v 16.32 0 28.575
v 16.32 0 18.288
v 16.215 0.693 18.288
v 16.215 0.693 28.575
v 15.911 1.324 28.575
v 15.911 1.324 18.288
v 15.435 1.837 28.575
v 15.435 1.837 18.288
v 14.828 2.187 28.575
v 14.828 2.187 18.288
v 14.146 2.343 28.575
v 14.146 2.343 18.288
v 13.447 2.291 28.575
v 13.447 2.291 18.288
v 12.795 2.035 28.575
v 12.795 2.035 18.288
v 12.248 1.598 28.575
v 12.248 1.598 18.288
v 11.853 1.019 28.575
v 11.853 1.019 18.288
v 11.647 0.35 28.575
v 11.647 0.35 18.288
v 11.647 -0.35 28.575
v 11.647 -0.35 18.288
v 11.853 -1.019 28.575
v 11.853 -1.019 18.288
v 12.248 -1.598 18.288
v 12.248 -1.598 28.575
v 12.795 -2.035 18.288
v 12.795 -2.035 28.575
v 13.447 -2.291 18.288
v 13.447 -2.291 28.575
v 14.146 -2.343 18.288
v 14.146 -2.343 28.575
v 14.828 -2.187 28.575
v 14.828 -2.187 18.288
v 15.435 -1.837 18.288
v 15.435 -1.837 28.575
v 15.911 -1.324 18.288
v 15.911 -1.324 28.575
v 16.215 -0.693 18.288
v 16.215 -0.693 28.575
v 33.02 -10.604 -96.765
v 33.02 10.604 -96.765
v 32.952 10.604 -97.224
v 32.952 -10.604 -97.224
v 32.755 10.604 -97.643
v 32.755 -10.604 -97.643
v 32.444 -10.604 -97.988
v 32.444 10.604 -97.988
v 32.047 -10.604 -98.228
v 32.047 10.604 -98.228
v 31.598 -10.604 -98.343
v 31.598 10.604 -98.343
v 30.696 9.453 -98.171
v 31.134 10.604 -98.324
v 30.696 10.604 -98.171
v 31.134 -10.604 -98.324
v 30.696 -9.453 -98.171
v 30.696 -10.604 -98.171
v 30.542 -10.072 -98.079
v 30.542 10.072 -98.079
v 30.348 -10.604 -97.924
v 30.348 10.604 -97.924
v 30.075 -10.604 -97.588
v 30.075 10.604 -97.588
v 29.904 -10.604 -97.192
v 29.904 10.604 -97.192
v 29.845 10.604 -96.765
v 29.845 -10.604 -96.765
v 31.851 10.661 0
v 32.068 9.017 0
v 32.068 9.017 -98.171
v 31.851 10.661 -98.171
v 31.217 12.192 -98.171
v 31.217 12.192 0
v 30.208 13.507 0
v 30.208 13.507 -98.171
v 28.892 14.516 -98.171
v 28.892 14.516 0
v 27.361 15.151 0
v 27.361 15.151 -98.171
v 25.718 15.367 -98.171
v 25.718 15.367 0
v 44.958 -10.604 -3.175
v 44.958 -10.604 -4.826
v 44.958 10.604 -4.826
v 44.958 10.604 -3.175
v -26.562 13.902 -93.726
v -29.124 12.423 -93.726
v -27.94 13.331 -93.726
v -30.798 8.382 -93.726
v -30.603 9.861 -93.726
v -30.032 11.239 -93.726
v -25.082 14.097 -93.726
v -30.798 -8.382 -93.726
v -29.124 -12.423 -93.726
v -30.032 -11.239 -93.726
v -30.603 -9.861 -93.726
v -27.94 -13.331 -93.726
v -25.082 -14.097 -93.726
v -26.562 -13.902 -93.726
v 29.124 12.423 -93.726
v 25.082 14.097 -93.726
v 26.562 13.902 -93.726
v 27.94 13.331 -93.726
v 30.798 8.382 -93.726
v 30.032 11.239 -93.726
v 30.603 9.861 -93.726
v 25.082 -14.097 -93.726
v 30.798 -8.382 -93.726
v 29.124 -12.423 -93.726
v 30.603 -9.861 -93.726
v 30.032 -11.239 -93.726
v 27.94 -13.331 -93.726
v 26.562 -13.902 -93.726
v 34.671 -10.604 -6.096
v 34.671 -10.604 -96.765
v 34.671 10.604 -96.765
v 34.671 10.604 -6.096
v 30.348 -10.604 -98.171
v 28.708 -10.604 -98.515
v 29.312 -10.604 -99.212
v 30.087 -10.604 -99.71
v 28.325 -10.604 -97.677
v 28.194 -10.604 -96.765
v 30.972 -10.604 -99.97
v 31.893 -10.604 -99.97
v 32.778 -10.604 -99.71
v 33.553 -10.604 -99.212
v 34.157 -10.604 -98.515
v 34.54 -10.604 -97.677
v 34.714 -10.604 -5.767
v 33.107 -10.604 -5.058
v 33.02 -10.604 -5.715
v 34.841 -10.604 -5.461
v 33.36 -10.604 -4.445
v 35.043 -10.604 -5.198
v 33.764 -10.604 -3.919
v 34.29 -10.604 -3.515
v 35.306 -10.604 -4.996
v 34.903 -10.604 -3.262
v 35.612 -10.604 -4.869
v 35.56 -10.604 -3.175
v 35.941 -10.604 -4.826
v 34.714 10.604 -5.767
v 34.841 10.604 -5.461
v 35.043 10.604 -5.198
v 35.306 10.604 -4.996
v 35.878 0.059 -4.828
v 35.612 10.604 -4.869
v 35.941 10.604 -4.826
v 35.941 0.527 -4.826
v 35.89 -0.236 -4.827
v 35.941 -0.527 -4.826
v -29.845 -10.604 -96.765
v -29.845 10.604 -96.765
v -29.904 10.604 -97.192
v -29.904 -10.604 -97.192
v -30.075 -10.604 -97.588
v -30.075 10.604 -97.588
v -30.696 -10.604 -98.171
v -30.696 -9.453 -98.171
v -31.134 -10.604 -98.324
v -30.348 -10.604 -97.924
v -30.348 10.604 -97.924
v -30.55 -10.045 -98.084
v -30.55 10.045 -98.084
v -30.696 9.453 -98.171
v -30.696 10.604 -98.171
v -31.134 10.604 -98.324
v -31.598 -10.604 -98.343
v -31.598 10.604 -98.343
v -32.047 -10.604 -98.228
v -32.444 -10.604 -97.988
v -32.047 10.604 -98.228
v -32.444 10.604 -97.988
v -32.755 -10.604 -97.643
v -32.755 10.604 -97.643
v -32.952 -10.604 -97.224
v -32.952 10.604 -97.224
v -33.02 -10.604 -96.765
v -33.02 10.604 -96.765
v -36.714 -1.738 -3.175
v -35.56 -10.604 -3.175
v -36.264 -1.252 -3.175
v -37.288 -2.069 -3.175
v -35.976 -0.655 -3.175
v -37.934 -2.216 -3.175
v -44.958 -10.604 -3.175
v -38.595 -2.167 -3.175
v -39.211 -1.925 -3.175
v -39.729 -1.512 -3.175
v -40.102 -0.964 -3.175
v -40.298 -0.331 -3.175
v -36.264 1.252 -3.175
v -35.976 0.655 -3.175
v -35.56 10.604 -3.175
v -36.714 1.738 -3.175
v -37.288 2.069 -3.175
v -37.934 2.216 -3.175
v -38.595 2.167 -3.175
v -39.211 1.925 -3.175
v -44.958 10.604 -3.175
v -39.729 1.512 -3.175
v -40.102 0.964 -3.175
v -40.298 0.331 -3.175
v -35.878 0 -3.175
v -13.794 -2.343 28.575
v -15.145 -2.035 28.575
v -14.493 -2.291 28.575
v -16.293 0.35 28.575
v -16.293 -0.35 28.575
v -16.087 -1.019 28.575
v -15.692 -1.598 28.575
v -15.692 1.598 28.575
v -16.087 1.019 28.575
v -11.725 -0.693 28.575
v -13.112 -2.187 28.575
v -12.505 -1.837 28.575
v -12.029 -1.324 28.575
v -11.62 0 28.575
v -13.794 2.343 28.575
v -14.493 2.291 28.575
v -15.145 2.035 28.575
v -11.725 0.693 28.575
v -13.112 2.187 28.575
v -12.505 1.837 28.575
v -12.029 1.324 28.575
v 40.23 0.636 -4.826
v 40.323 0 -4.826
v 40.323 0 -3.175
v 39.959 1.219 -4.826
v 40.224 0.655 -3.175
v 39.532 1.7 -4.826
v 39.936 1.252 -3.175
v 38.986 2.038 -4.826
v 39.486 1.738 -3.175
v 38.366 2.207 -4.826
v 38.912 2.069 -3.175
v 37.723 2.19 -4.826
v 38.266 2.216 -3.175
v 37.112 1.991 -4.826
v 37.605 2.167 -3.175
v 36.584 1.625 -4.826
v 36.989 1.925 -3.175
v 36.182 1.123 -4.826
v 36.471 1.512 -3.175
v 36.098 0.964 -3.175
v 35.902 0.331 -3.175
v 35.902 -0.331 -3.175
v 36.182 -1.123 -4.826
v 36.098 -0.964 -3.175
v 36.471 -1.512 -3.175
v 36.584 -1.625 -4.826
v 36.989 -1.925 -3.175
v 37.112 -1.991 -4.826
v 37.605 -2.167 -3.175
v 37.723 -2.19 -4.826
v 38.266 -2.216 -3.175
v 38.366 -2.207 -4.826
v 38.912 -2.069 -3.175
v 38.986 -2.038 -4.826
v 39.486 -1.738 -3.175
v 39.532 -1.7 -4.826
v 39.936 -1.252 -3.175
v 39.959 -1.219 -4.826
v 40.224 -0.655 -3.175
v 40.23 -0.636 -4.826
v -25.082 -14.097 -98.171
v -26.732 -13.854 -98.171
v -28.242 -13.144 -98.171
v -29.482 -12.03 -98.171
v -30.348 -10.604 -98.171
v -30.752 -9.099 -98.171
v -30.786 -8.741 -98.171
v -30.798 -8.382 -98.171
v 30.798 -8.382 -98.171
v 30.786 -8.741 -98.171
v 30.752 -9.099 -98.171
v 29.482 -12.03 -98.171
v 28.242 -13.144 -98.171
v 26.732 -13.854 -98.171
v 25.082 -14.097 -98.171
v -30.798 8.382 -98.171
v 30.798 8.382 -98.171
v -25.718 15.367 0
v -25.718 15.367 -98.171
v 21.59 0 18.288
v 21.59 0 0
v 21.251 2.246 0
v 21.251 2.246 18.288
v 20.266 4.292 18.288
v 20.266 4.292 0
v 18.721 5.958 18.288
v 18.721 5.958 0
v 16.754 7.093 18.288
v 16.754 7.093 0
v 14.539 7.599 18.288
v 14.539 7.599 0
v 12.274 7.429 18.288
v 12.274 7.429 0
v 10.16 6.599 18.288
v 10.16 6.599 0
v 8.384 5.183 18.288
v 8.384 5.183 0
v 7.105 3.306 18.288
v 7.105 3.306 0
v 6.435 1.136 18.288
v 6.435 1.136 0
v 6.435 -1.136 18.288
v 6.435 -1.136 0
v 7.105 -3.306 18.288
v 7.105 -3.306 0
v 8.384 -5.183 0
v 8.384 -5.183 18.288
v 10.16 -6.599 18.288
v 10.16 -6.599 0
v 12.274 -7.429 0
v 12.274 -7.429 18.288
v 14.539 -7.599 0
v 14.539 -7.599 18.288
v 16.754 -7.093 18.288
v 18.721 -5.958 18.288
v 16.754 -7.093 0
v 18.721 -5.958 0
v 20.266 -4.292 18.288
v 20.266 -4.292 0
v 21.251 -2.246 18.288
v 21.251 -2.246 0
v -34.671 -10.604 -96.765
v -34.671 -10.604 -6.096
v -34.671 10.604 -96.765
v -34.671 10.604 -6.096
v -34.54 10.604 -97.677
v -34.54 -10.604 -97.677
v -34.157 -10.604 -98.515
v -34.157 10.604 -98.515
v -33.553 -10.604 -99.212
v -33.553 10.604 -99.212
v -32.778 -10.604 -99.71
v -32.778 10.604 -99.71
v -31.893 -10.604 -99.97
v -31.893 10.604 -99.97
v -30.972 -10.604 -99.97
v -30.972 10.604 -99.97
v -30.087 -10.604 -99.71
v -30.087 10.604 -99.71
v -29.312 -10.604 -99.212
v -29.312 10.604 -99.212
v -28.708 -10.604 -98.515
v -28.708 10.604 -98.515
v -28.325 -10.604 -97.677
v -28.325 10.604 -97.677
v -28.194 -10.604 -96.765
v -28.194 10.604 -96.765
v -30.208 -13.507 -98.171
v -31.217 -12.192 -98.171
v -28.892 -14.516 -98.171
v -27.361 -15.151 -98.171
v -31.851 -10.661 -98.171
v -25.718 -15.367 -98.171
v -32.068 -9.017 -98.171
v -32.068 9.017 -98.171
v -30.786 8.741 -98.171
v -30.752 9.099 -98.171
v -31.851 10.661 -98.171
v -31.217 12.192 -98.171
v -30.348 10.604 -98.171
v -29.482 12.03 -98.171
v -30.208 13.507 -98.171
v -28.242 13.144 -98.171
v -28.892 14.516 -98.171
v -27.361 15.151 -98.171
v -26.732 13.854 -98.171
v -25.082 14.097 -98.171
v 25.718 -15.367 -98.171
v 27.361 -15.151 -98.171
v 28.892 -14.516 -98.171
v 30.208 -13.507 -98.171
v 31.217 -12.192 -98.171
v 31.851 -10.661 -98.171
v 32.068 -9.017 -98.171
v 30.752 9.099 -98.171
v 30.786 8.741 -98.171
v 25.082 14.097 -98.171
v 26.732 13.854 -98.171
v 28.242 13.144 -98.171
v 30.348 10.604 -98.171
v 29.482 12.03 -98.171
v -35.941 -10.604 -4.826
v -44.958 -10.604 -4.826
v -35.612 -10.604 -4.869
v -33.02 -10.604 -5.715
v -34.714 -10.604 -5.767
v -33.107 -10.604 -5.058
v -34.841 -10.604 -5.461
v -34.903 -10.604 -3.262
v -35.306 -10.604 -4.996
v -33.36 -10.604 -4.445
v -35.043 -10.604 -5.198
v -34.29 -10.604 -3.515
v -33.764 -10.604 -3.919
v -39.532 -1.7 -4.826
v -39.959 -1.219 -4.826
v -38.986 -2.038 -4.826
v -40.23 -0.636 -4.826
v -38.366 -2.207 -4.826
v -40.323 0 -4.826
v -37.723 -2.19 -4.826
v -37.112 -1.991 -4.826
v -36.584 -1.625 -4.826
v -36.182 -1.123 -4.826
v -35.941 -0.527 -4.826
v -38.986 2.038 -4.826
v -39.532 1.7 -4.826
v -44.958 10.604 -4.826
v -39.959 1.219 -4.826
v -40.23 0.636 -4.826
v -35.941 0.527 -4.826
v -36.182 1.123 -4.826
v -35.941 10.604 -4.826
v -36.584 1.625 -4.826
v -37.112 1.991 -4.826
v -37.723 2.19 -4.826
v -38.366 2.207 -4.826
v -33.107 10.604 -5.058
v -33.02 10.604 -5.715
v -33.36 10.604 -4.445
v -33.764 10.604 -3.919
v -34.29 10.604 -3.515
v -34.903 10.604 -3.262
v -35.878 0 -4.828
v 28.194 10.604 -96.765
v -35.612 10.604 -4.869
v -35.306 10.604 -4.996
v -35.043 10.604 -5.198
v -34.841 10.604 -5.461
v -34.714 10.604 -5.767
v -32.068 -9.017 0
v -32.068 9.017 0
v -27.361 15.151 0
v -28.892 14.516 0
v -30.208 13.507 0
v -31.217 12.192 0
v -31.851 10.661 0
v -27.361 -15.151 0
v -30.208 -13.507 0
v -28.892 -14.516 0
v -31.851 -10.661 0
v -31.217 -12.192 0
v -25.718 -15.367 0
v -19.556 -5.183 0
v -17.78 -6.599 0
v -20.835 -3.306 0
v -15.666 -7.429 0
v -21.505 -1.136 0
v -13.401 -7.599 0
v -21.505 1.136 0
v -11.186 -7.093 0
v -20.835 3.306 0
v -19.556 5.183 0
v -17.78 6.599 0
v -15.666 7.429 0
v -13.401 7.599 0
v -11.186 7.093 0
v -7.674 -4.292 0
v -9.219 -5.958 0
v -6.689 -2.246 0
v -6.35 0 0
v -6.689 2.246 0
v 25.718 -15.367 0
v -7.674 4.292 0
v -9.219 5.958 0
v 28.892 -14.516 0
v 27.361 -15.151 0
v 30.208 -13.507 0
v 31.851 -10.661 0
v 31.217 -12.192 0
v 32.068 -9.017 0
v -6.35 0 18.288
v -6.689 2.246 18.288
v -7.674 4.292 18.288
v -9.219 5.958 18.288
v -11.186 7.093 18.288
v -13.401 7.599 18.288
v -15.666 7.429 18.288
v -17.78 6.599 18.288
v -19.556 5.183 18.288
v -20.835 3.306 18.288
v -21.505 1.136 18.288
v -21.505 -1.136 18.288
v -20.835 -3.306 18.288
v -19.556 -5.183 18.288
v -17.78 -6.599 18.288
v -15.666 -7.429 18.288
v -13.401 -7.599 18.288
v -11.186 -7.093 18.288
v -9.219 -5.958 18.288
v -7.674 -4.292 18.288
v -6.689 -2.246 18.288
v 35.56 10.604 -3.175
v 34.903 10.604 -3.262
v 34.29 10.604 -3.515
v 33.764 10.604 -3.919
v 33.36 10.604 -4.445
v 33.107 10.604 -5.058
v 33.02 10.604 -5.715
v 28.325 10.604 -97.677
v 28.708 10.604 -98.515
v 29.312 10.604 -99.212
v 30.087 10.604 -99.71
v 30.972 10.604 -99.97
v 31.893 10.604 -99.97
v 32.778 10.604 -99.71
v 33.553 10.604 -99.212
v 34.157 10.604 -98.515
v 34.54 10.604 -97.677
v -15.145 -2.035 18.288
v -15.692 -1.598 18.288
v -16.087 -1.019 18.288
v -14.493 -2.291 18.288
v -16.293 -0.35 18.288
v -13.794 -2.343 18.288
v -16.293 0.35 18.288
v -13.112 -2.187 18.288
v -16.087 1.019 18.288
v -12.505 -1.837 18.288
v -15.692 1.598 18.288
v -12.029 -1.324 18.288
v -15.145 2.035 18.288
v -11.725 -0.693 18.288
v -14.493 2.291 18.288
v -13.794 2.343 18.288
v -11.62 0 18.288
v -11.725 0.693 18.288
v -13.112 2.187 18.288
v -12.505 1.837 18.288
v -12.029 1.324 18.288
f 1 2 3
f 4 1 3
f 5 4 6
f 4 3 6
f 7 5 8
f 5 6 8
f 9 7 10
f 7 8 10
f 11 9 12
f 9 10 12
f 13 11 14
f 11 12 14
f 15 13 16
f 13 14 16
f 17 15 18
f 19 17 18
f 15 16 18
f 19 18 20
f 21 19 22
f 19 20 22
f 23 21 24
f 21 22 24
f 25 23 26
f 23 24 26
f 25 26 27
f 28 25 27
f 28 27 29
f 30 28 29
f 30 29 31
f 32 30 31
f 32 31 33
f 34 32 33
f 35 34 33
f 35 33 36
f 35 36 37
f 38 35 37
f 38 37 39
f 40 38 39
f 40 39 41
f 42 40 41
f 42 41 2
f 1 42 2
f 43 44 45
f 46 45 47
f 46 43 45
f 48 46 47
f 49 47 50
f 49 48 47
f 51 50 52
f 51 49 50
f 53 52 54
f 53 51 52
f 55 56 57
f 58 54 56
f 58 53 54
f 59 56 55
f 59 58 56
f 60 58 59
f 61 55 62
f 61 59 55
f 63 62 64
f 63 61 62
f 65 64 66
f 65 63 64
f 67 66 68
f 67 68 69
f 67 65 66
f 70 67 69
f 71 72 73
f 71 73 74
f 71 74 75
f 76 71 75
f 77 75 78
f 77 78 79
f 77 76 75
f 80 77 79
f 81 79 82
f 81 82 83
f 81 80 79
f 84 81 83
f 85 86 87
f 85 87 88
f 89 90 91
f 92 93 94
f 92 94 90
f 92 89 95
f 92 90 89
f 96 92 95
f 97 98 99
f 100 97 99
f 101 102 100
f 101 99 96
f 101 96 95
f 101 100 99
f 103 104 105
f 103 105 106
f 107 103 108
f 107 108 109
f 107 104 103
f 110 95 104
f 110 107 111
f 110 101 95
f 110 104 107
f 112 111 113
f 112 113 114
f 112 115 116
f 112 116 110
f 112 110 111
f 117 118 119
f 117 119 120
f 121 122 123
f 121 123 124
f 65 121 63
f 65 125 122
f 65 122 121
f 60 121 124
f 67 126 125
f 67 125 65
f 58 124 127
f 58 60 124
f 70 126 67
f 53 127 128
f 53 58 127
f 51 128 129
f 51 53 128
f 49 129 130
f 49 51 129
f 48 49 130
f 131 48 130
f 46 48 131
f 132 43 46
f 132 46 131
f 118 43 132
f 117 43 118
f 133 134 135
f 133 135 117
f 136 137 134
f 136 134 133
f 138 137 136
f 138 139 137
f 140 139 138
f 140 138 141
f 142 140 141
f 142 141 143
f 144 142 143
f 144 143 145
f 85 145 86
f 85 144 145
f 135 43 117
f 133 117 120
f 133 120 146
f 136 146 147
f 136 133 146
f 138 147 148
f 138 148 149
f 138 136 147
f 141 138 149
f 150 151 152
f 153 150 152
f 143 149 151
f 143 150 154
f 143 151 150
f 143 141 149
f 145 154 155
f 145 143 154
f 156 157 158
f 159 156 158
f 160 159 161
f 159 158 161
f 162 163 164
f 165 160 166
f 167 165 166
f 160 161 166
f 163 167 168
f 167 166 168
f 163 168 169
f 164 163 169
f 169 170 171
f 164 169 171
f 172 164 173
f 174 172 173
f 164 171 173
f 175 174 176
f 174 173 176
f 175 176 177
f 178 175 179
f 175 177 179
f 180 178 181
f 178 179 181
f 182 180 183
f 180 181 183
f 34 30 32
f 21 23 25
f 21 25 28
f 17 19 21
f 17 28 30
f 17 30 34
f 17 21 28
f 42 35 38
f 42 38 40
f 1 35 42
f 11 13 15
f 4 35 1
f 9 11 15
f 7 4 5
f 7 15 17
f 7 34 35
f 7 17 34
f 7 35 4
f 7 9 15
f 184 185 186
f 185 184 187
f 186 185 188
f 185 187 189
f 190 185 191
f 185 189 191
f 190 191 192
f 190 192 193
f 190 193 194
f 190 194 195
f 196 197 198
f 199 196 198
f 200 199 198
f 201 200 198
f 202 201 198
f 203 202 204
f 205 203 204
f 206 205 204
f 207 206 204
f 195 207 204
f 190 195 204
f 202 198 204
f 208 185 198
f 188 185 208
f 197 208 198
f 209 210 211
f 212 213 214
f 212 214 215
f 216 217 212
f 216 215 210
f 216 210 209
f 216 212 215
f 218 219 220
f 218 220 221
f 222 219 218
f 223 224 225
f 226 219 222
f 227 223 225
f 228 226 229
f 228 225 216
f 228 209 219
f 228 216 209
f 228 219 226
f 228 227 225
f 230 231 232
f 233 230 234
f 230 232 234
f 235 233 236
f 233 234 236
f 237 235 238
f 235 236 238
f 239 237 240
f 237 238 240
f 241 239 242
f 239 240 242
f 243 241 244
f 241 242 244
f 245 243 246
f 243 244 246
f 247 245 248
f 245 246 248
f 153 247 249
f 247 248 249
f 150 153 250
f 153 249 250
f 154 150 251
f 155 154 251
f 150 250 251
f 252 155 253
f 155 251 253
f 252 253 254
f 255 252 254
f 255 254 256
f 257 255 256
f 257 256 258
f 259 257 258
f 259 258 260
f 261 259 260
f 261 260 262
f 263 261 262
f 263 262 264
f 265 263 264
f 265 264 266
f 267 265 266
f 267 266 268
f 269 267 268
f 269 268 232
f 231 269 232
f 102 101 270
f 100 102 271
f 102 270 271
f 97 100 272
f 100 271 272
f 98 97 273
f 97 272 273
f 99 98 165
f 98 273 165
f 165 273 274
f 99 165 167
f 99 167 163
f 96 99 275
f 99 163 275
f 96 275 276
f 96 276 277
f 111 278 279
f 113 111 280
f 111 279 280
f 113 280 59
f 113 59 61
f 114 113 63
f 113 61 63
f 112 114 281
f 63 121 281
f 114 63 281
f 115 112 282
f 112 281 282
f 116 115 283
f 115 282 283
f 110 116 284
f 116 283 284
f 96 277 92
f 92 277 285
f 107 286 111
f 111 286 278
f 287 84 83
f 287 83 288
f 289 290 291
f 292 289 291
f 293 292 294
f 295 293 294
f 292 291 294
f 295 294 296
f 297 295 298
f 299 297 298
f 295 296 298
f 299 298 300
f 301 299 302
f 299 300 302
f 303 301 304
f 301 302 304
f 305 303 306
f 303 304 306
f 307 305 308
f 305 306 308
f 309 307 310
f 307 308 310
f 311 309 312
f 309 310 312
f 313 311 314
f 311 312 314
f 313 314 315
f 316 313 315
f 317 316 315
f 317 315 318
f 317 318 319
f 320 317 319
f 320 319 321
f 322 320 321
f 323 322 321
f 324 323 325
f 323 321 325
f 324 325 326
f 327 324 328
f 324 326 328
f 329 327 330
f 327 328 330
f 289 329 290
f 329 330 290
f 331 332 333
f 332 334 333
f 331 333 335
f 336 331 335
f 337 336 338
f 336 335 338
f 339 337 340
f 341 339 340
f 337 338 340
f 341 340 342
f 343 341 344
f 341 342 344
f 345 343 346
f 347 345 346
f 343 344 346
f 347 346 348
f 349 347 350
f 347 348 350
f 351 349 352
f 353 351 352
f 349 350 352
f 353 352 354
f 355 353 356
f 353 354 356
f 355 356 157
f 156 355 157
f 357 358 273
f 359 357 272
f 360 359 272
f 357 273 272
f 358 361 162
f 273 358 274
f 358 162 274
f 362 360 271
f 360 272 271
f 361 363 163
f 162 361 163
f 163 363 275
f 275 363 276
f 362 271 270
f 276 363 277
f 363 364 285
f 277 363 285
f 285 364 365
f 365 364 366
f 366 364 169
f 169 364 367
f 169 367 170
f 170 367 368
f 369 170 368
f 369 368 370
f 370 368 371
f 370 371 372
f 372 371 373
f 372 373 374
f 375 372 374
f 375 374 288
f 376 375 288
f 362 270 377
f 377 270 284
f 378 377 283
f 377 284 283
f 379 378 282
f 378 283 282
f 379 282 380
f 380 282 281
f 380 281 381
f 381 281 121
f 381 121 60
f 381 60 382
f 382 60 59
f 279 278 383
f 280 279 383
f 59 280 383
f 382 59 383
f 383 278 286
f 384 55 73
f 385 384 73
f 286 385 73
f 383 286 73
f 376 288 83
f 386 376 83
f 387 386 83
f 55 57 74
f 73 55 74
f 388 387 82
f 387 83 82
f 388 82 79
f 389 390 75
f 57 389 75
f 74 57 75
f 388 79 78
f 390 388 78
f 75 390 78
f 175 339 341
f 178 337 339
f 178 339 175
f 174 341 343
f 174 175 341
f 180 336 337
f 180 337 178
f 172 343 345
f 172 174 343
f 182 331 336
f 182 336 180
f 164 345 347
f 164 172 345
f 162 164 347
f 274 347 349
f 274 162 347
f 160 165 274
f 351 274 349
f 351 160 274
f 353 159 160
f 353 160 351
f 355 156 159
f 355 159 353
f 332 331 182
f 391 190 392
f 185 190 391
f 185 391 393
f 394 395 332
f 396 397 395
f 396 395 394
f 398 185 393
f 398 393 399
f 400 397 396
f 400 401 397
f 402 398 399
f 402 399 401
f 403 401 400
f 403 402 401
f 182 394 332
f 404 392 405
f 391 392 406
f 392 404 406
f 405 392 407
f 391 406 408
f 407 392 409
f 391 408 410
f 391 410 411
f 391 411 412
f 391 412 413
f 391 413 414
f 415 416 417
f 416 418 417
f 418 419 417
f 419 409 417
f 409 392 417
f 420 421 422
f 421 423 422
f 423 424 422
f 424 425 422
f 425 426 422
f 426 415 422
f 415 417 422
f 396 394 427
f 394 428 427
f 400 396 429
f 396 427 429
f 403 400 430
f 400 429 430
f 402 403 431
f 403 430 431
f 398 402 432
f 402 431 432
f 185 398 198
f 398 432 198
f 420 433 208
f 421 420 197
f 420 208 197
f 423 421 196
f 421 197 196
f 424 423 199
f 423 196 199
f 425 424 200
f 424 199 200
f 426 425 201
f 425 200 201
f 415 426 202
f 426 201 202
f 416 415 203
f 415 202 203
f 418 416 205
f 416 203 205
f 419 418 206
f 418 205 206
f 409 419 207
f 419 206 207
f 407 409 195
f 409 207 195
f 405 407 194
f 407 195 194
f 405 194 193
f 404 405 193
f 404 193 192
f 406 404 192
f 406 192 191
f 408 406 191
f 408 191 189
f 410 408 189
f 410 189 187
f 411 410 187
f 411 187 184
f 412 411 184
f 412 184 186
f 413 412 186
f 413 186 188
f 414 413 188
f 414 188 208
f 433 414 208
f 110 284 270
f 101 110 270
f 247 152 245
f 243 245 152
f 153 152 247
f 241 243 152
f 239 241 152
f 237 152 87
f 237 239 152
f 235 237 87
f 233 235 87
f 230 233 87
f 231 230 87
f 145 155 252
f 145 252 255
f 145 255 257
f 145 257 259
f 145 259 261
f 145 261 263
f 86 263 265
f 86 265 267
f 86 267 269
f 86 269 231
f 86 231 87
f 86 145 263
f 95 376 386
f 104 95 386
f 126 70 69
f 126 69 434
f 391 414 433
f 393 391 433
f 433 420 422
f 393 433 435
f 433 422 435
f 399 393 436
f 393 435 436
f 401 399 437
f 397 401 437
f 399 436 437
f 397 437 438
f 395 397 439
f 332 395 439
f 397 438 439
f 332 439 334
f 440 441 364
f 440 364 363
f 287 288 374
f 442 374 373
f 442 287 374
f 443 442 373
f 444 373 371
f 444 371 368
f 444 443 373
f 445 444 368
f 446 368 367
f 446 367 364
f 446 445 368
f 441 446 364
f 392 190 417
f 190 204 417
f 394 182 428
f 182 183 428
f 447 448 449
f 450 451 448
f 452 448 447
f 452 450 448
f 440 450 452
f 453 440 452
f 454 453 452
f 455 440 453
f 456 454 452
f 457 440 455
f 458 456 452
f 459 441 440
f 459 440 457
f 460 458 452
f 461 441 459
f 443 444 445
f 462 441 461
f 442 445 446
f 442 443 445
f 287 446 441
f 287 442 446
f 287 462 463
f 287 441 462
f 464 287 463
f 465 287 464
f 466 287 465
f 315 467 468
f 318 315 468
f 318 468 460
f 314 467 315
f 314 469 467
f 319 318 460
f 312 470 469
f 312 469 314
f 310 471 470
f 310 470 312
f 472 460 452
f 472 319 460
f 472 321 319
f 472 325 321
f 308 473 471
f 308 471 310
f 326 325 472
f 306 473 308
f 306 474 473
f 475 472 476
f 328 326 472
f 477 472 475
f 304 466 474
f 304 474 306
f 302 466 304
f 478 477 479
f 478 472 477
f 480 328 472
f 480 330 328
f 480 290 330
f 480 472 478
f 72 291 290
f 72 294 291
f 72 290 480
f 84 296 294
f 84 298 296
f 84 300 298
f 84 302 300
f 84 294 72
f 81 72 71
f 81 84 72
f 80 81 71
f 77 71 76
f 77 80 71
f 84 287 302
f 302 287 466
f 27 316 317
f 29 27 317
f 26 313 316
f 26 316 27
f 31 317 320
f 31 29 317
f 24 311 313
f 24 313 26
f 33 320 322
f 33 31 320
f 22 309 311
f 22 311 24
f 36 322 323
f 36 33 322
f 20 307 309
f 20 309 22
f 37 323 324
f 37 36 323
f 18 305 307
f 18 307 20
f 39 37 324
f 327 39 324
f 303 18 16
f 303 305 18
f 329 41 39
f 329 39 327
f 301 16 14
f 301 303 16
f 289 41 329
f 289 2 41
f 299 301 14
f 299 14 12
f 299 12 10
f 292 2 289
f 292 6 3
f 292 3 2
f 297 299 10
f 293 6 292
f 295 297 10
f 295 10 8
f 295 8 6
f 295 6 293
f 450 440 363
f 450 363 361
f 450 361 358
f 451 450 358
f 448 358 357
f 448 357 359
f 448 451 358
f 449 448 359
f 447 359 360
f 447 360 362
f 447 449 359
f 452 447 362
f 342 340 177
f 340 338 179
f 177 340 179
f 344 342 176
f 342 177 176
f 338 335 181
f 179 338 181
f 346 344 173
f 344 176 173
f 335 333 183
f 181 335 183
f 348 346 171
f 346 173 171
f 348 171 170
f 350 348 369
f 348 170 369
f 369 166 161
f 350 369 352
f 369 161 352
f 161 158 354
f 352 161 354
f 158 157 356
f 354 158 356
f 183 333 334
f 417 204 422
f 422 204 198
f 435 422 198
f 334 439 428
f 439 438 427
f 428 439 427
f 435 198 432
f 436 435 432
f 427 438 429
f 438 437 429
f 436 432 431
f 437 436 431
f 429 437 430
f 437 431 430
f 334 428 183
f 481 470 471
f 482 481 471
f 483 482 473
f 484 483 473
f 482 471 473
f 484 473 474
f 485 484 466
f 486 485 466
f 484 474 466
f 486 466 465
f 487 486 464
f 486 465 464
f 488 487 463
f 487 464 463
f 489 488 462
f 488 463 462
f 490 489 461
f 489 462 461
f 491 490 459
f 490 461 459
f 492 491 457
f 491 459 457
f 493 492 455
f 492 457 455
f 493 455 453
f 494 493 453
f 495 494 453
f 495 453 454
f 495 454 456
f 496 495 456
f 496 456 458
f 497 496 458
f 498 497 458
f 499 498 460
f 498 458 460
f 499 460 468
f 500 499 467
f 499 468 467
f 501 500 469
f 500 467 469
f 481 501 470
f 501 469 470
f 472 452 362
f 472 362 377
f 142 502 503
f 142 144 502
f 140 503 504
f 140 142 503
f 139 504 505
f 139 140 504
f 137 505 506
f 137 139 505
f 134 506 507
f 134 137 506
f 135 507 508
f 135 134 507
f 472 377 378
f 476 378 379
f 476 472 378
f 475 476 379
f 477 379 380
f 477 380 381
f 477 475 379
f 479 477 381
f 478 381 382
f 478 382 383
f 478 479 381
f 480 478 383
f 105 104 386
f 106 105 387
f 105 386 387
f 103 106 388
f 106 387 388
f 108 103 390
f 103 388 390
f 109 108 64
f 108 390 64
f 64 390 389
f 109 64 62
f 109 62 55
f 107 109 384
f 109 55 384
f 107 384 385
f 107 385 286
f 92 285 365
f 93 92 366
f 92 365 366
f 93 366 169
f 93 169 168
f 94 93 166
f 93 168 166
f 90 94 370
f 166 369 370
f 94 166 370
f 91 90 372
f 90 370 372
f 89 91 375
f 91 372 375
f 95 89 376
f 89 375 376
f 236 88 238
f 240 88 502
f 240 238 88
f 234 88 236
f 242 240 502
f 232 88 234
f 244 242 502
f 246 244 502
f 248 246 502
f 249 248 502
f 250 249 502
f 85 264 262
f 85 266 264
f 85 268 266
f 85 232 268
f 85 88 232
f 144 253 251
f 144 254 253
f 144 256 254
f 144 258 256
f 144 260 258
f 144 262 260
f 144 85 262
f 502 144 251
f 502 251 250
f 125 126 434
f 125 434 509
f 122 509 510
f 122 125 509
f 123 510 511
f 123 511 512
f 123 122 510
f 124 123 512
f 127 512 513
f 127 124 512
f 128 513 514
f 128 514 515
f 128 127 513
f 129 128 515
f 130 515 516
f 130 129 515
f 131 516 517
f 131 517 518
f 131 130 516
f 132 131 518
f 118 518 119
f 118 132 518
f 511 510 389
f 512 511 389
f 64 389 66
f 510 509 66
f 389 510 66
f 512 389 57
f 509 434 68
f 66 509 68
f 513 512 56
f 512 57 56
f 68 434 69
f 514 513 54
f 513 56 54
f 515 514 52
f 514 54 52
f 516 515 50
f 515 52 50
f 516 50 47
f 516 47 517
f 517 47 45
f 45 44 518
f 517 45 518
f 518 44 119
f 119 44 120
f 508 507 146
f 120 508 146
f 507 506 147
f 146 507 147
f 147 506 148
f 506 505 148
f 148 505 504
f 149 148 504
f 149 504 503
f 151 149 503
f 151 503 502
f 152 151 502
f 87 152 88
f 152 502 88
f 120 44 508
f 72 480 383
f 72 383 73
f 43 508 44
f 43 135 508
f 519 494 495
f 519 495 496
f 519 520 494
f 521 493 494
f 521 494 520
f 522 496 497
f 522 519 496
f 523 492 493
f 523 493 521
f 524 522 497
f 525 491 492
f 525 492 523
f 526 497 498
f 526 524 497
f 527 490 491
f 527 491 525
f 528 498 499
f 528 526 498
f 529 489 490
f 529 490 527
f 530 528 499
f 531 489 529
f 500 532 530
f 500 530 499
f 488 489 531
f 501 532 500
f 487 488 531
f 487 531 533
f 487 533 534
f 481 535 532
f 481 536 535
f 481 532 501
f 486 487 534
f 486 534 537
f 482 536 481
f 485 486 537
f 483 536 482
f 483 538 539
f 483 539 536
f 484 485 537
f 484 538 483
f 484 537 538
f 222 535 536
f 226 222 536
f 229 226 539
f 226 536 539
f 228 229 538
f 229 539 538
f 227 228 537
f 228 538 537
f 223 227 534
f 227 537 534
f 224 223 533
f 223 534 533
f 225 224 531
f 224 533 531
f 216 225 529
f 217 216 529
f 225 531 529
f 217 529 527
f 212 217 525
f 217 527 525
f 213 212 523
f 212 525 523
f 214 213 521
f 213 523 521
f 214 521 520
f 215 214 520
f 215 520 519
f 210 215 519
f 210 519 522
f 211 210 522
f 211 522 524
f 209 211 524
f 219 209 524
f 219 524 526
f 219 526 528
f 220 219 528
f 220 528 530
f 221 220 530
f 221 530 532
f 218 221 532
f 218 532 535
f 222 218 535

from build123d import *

# Parameters (mm, degrees)
F0_R     = 7.62
F0_R_2   = 2.3495
F1_DEPTH = 98.171
F2_DEPTH = 18.288
F3_DEPTH = 28.575
F5_DEPTH = 4.445
F7_DEPTH = 10.6045
F8_R     = 2.2225
F9_DEPTH = 2.54


with BuildPart() as f1:
    # F0 (on Top) → F1 (new body)
    with BuildSketch(Plane.XY):
        with BuildLine():
            ThreePointArc((32.0675, 9.017), (30.207628, 13.507128), (25.7175, 15.367))
            Line((25.7175, 15.367), (-25.7175, 15.367))
            ThreePointArc((-25.7175, 15.367), (-30.207628, 13.507128), (-32.0675, 9.017))
            Line((-32.0675, 9.017), (-32.0675, -9.017))
            ThreePointArc((-32.0675, -9.017), (-30.207628, -13.507128), (-25.7175, -15.367))
            Line((-25.7175, -15.367), (25.7175, -15.367))
            ThreePointArc((25.7175, -15.367), (30.207628, -13.507128), (32.0675, -9.017))
            Line((32.0675, -9.017), (32.0675, 9.017))
        make_face()
        with Locations((-13.97, 0)):
            Circle(F0_R, mode=Mode.SUBTRACT)
        with Locations((13.97, 0)):
            Circle(F0_R, mode=Mode.SUBTRACT)
        with Locations((-13.97, 0)):
            Circle(F0_R)
        with Locations((-13.97, 0)):
            Circle(F0_R_2, mode=Mode.SUBTRACT)
        with Locations((-13.97, 0)):
            Circle(F0_R_2)
        with Locations((13.97, 0)):
            Circle(F0_R)
        with Locations((13.97, 0)):
            Circle(F0_R_2, mode=Mode.SUBTRACT)
        with Locations((13.97, 0)):
            Circle(F0_R_2)
    extrude(amount=-F1_DEPTH)

    # F0 (on Top) → F2 (join)
    with BuildSketch(Plane.XY):
        with Locations((-13.97, 0)):
            Circle(F0_R)
        with Locations((-13.97, 0)):
            Circle(F0_R_2, mode=Mode.SUBTRACT)
        with Locations((-13.97, 0)):
            Circle(F0_R_2)
        with Locations((13.97, 0)):
            Circle(F0_R)
        with Locations((13.97, 0)):
            Circle(F0_R_2, mode=Mode.SUBTRACT)
        with Locations((13.97, 0)):
            Circle(F0_R_2)
    extrude(amount=F2_DEPTH)

    # F0 (on Top) → F3 (join)
    with BuildSketch(Plane.XY):
        with Locations((-13.97, 0)):
            Circle(F0_R_2)
        with Locations((13.97, 0)):
            Circle(F0_R_2)
    extrude(amount=F3_DEPTH)

    # F4 (on face) → F5 (cut)
    with BuildSketch(Plane(origin=(0, 0, -98.171), x_dir=(1, 0, 0), z_dir=(0, 0, -1))):
        with BuildLine():
            Line((25.0825, 14.097), (-25.0825, 14.097))
            ThreePointArc((-25.0825, 14.097), (-29.123615, 12.423115), (-30.7975, 8.382))
            Line((-30.7975, 8.382), (-30.7975, -8.382))
            ThreePointArc((-30.7975, -8.382), (-29.123615, -12.423115), (-25.0825, -14.097))
            Line((-25.0825, -14.097), (25.0825, -14.097))
            ThreePointArc((25.0825, -14.097), (29.123615, -12.423115), (30.7975, -8.382))
            Line((30.7975, -8.382), (30.7975, 8.382))
            ThreePointArc((30.7975, 8.382), (29.123615, 12.423115), (25.0825, 14.097))
        make_face()
    extrude(amount=-F5_DEPTH, mode=Mode.SUBTRACT)

    # F6 (on Front) → F7 (join, symmetric)
    with BuildSketch(Plane.XZ):
        with BuildLine():
            ThreePointArc((-29.845, -96.764594), (-31.4325, -98.352094), (-33.02, -96.764594))
            Line((-33.02, -96.764594), (-33.02, -5.715))
            ThreePointArc((-33.02, -5.715), (-33.763949, -3.918949), (-35.56, -3.175))
            Line((-35.56, -3.175), (-44.958, -3.175))
            Line((-44.958, -3.175), (-44.958, -4.826))
            Line((-44.958, -4.826), (-35.941, -4.826))
            ThreePointArc((-35.941, -4.826), (-35.042974, -5.197974), (-34.671, -6.096))
            Line((-34.671, -6.096), (-34.671, -96.764594))
            ThreePointArc((-34.671, -96.764594), (-31.4325, -100.003094), (-28.194, -96.764594))
            Line((-28.194, -96.764594), (-29.845, -96.764594))
        make_face()
        with BuildLine():
            ThreePointArc((33.02, -96.764594), (31.4325, -98.352094), (29.845, -96.764594))
            Line((29.845, -96.764594), (28.194, -96.764594))
            ThreePointArc((28.194, -96.764594), (31.4325, -100.003094), (34.671, -96.764594))
            Line((34.671, -96.764594), (34.671, -6.096))
            ThreePointArc((34.671, -6.096), (35.042974, -5.197974), (35.941, -4.826))
            Line((35.941, -4.826), (44.958, -4.826))
            Line((44.958, -4.826), (44.958, -3.175))
            Line((44.958, -3.175), (35.56, -3.175))
            ThreePointArc((35.56, -3.175), (33.763949, -3.918949), (33.02, -5.715))
            Line((33.02, -5.715), (33.02, -96.764594))
        make_face()
    extrude(amount=F7_DEPTH, both=True)

    # F8 (on face) → F9 (cut)
    with BuildSketch(Plane.XY.offset(-3.175)):
        with Locations((38.1, 0)):
            Circle(F8_R)
        with Locations((-38.1, 0)):
            Circle(F8_R)
    extrude(amount=-F9_DEPTH, mode=Mode.SUBTRACT)


solid = f1.part
